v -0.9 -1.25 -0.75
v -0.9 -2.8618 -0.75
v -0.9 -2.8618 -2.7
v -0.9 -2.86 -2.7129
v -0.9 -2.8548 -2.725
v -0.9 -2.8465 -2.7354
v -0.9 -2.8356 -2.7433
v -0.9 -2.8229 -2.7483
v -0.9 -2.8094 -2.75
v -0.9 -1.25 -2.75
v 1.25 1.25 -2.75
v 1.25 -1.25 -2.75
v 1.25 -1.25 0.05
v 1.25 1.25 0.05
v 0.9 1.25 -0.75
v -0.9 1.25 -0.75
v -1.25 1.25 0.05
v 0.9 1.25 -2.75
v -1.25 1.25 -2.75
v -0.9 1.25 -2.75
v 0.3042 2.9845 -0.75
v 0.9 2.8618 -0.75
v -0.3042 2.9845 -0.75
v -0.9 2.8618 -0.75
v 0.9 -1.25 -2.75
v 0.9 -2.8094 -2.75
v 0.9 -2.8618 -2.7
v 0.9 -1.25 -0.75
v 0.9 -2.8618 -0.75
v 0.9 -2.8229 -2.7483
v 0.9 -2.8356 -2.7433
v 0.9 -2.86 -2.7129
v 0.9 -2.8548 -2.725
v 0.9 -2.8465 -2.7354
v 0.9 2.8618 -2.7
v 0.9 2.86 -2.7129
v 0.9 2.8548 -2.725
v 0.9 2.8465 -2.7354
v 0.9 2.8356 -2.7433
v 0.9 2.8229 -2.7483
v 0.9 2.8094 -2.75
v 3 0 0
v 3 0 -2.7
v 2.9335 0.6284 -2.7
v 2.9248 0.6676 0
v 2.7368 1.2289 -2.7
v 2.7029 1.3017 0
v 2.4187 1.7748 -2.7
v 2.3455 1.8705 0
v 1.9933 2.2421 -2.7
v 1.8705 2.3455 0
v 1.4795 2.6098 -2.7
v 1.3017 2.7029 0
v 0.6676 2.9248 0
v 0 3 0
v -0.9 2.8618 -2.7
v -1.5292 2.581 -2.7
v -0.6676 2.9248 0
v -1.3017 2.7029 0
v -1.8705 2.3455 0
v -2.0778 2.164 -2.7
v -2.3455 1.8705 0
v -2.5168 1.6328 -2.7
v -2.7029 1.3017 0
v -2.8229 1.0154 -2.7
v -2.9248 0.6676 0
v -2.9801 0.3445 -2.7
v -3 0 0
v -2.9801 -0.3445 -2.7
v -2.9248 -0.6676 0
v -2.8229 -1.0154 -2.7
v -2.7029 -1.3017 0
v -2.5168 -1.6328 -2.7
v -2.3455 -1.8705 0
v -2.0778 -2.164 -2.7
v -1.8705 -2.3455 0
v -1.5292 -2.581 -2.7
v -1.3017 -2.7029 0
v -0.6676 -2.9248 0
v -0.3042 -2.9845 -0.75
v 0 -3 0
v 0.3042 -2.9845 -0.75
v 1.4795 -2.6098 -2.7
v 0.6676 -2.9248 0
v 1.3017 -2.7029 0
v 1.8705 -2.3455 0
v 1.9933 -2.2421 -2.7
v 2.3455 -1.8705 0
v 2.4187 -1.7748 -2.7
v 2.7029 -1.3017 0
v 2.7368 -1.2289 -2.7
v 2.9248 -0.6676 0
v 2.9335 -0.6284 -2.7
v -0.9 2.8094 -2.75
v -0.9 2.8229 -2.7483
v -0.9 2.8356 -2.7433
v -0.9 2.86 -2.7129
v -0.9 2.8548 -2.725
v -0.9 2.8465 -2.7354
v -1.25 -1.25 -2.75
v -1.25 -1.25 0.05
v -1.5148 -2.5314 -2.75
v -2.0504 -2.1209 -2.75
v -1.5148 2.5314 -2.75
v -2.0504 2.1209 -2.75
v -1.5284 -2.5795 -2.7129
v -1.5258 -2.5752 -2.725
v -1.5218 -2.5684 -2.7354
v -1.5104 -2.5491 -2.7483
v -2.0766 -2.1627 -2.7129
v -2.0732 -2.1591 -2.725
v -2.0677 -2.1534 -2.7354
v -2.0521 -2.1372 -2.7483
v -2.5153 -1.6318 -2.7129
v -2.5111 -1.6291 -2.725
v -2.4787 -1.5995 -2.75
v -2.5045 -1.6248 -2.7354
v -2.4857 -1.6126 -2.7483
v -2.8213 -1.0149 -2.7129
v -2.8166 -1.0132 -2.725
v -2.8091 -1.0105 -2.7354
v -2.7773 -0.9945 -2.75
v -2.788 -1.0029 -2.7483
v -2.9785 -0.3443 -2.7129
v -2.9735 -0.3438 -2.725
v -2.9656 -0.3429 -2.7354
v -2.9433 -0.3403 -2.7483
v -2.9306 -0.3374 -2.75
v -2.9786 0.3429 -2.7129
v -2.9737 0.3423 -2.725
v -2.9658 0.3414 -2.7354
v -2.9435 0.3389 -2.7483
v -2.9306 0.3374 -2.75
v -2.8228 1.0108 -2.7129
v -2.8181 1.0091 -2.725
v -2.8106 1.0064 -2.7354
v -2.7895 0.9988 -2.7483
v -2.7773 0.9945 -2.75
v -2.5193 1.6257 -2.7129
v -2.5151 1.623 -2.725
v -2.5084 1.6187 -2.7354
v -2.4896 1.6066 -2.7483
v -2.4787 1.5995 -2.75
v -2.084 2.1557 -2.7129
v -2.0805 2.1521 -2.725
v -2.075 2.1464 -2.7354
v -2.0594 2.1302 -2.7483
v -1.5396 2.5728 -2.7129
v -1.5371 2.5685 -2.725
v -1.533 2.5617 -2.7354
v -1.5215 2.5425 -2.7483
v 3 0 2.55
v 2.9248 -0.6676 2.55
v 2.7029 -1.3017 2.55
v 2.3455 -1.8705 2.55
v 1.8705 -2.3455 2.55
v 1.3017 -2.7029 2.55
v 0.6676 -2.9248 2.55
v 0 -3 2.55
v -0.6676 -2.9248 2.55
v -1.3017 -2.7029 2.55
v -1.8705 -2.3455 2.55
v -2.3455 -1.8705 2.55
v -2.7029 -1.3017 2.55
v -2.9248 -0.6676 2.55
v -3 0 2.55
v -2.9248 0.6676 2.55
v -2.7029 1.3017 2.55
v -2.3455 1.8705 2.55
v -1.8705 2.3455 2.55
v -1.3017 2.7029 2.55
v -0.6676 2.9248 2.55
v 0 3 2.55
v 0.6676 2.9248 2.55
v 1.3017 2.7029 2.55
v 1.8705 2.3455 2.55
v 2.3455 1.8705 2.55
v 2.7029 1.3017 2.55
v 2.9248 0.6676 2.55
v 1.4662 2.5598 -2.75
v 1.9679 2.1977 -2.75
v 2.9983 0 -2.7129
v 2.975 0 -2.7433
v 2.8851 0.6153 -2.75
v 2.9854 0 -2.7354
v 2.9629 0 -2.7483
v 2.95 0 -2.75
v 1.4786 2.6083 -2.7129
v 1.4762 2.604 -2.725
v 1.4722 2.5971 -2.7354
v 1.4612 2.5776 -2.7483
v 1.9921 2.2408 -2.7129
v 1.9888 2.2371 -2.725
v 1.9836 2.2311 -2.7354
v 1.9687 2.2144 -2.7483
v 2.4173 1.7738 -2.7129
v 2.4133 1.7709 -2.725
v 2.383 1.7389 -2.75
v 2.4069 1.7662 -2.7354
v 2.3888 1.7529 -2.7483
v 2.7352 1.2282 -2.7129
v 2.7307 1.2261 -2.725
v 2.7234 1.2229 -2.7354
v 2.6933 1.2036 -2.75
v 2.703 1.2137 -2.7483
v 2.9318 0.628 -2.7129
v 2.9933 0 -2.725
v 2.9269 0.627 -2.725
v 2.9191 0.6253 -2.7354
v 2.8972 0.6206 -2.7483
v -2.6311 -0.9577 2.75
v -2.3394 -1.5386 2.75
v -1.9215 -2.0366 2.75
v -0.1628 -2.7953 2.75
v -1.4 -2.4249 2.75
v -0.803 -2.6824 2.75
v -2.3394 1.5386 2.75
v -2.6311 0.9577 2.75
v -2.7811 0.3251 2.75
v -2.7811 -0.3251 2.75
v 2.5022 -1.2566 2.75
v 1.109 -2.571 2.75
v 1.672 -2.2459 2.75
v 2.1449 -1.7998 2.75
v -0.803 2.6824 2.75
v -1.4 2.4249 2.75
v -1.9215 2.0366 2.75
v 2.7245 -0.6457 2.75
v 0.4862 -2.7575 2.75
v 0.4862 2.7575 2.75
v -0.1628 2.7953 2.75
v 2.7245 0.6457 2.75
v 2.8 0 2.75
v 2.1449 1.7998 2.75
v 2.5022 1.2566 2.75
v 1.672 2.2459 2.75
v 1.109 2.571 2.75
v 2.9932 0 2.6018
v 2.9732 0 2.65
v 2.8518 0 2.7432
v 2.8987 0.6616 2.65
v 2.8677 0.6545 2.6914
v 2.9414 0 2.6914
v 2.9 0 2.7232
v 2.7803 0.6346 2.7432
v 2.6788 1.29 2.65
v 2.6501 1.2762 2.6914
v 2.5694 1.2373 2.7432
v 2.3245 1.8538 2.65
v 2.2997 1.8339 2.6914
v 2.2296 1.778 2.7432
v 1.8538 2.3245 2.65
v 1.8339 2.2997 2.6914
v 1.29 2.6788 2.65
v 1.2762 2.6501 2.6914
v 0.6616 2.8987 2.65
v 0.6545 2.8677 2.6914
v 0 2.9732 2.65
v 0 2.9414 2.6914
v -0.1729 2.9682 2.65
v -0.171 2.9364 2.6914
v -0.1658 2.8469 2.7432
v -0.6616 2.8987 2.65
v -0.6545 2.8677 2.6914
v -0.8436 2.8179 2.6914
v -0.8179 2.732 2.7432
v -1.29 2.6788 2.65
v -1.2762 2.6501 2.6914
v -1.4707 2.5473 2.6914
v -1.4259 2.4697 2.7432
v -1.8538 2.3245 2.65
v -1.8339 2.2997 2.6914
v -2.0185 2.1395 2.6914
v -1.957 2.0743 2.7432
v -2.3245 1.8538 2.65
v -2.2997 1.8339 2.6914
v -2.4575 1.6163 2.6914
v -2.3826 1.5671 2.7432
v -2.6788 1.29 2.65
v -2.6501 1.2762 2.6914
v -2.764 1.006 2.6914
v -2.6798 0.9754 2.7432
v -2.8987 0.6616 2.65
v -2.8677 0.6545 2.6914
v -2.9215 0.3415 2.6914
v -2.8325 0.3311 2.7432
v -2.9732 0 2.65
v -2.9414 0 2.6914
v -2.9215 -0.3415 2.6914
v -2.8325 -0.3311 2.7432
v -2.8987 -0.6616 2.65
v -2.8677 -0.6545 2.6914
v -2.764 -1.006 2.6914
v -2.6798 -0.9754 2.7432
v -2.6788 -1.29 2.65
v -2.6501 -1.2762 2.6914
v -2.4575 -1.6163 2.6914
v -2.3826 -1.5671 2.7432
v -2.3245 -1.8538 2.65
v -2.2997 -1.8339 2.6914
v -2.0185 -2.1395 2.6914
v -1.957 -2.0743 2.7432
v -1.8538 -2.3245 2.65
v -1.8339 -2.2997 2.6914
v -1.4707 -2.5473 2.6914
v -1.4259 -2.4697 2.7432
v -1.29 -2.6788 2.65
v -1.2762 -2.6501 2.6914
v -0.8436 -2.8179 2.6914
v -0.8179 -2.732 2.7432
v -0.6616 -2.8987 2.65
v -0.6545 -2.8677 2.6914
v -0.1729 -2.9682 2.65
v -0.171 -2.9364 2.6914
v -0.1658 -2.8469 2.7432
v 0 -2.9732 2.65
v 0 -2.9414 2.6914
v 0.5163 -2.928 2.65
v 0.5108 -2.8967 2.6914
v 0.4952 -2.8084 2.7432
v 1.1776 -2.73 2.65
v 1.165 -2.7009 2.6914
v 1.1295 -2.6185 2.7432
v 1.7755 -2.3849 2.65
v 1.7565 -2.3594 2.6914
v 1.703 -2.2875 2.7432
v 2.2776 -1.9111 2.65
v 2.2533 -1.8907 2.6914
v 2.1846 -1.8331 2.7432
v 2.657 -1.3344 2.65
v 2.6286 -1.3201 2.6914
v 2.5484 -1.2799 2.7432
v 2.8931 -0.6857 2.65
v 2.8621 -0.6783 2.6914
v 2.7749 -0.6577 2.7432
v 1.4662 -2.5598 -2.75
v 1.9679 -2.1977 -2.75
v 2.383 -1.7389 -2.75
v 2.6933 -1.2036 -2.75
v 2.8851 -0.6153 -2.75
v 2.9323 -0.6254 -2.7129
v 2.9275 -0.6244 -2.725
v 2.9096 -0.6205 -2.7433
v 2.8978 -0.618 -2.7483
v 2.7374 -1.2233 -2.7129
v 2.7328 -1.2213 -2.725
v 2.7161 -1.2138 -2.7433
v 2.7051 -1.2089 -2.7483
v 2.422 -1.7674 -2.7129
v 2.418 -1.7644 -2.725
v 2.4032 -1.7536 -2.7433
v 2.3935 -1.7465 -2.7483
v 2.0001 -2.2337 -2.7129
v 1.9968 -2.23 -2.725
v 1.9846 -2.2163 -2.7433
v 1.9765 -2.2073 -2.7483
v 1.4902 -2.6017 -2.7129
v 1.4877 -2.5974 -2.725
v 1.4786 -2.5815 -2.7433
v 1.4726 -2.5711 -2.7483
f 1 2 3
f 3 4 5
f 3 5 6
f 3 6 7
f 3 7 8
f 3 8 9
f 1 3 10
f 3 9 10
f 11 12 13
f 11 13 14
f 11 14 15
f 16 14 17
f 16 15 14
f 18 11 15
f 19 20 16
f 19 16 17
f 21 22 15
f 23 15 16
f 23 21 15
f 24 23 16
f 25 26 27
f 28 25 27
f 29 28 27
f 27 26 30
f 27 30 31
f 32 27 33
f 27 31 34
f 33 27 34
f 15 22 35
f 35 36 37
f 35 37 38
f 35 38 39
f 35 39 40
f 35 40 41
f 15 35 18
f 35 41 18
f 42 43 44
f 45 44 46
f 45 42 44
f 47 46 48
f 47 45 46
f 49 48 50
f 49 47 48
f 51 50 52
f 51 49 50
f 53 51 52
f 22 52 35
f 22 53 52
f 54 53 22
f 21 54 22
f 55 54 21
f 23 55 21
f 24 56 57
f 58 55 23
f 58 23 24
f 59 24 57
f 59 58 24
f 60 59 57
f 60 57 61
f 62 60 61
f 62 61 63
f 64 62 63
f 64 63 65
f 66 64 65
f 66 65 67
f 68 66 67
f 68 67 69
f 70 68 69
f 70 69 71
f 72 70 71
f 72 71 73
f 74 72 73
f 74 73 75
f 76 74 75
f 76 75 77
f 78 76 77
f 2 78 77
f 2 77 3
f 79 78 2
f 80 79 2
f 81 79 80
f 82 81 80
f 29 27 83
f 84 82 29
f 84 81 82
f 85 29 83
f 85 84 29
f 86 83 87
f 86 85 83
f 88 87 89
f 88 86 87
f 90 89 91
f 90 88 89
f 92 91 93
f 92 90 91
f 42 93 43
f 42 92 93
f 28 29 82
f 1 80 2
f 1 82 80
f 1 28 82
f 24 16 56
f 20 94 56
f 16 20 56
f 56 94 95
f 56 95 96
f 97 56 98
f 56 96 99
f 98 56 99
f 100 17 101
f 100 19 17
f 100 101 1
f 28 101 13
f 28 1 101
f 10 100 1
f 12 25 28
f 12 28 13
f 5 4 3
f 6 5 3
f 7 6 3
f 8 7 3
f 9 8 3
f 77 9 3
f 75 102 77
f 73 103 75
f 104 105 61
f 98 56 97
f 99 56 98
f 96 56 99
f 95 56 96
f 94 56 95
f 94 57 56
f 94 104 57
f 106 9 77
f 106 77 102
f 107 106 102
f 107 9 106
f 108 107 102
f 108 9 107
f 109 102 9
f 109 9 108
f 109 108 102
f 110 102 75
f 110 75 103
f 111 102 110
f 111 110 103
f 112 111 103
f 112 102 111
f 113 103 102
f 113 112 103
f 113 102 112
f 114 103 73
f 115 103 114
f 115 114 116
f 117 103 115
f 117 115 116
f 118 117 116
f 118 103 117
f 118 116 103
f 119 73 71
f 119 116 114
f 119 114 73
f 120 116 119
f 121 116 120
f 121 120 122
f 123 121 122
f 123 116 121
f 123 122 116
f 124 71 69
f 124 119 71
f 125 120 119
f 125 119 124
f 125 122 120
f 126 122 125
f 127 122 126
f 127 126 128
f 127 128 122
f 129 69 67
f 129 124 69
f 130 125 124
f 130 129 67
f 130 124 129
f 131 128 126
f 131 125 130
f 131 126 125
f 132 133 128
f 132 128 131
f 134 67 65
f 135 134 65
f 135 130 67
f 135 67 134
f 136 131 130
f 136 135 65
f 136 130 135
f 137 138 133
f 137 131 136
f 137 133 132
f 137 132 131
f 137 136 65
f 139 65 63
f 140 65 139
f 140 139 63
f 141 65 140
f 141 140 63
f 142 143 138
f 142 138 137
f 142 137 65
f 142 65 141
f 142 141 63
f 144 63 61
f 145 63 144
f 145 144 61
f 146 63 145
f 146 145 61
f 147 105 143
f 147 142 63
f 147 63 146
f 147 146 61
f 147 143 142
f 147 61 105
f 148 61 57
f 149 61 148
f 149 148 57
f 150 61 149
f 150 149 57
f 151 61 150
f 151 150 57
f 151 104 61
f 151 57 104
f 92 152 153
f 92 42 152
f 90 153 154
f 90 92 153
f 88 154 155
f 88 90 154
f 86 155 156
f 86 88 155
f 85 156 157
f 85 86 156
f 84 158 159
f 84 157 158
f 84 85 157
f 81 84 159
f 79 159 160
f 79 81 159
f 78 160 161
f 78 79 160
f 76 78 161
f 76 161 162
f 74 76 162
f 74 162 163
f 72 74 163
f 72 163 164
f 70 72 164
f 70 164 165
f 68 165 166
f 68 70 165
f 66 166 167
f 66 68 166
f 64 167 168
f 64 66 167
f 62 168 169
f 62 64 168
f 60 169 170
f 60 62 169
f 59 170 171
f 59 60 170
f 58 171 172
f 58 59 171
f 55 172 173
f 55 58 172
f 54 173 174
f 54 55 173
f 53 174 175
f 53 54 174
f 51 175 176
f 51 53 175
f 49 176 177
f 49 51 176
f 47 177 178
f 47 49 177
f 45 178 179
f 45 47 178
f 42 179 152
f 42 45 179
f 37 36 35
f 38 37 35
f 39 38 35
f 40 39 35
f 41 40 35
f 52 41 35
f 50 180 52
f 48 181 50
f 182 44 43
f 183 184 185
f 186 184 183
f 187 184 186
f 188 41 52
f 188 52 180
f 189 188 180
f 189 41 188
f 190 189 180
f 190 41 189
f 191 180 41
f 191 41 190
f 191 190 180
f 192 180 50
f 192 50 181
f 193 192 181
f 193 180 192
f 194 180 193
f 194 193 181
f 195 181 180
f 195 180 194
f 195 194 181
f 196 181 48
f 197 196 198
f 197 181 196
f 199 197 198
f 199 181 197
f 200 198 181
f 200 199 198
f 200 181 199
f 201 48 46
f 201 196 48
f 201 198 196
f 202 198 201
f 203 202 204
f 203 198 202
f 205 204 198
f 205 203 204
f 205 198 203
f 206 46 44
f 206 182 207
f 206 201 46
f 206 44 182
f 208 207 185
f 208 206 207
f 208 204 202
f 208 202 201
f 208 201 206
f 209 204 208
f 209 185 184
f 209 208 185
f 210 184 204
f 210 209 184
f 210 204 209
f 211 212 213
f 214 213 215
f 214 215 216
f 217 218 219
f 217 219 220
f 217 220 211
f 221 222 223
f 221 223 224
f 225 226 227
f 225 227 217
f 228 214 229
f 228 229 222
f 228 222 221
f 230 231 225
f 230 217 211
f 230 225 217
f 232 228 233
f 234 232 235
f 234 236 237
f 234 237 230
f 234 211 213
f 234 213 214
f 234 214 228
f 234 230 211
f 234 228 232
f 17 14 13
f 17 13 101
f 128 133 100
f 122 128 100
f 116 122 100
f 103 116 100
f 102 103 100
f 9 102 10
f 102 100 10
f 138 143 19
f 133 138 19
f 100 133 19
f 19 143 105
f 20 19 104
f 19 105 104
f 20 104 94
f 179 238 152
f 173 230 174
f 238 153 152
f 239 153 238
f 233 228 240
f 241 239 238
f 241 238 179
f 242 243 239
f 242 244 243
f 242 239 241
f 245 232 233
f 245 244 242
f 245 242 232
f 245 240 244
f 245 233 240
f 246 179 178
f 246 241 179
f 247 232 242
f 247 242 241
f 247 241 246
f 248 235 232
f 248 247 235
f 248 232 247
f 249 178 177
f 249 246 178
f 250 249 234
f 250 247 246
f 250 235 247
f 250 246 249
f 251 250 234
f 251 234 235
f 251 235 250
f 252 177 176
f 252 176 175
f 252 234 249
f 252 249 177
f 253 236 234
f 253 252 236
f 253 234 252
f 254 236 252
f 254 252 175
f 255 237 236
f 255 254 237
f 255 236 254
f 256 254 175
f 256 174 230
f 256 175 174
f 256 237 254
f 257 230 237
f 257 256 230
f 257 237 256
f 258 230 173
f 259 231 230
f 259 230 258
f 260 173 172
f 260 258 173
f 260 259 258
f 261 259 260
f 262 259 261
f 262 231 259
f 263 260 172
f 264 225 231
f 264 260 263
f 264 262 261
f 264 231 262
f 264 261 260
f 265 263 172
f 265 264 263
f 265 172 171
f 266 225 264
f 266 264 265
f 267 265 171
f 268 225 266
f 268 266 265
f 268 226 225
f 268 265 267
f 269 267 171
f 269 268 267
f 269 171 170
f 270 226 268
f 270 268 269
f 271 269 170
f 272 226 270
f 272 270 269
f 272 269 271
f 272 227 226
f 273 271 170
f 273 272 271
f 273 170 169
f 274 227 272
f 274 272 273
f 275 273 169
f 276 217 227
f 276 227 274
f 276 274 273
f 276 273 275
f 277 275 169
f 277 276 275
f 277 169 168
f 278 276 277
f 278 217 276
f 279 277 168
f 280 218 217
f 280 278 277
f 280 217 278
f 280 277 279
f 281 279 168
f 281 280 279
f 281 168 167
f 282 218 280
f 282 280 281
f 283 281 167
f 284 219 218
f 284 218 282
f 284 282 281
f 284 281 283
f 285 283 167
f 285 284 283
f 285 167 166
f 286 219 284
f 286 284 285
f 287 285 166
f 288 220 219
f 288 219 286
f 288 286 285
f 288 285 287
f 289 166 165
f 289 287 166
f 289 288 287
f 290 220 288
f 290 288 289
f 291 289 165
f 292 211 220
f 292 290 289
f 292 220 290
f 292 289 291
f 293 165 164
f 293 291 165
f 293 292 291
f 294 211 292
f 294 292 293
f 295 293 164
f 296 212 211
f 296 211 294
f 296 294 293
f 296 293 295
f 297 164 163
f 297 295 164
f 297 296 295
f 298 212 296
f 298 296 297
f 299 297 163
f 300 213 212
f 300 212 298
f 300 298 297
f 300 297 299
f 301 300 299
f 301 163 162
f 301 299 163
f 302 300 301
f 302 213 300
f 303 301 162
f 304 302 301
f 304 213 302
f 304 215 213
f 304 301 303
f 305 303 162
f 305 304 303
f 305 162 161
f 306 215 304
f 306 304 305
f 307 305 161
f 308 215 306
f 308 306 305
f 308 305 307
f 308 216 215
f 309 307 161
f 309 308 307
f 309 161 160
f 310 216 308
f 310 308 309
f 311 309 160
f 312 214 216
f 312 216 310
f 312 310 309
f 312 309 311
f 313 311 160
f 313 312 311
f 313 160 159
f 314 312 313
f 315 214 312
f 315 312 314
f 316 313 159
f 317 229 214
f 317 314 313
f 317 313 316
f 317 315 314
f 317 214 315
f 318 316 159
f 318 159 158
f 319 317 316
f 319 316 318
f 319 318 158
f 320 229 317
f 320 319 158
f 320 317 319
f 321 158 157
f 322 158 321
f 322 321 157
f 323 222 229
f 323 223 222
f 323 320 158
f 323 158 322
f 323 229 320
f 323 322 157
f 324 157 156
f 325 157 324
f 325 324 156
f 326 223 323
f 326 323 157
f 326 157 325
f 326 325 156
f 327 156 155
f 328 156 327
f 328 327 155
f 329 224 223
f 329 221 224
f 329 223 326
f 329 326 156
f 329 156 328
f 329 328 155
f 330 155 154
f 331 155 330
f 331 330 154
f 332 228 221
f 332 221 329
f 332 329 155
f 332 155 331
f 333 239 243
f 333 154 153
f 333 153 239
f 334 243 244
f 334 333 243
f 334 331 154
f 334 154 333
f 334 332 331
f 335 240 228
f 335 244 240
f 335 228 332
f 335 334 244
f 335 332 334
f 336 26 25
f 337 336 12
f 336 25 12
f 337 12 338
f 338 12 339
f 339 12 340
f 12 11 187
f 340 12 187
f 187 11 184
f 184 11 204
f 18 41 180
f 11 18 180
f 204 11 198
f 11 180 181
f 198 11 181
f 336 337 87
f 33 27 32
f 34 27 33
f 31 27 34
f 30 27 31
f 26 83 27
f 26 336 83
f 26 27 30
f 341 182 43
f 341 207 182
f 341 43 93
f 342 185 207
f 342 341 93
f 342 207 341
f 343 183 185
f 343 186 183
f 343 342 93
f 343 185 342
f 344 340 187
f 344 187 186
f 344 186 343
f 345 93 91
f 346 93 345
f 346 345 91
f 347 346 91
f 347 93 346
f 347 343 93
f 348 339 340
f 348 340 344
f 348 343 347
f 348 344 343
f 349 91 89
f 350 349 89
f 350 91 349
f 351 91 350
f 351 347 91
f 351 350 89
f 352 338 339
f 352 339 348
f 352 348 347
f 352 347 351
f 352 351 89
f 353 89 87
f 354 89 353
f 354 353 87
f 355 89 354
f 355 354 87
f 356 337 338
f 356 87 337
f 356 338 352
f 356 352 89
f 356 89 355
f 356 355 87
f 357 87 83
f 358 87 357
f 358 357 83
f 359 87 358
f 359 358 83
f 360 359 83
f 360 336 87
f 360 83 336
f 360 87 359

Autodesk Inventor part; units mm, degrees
ref_plane "YZ Plane" through (0, 0, 0) normal (1, 0, 0) x (0, 1, 0)
ref_plane "XZ Plane" through (0, 0, 0) normal (0, 1, 0) x (-1, 0, 0)
ref_plane "XY Plane" through (0, 0, 0) normal (0, 0, 1) x (1, 0, 0)
sketch "Sketch1" plane through (0, 0, 0) normal (0, 0, 1) x (1, 0, 0)
  circle A0 centre (0, 0) radius 3
  dimension "d0" = 6
extrude "Extrusion1" add sketch "Sketch1" along normal mid plane 5.5
fillet "Fillet1" radius 0.2 1 edges at (-3, 0, 2.75)
fillet "Fillet1" radius 0.05 1 edges at (-3, 0, -2.75)
sketch "Sketch2" plane through (0, 0, -2.75) normal (0, 0, -1) x (-1, 0, 0)
  line L0 (1.25, -1.25) -> (-1.25, -1.25)
  line L1 (-1.25, -1.25) -> (-1.25, 1.25)
  line L2 (-1.25, 1.25) -> (1.25, 1.25)
  line L3 (1.25, 1.25) -> (1.25, -1.25)
  line L4 (1.25, -1.25) -> (-1.25, 1.25) construction
  line L5 (-1.25, -1.25) -> (1.25, 1.25) construction
  point P0 (0, 0)
  dimension "d5" = 2.5
extrude "Extrusion2" cut sketch "Sketch2" against normal blind 2.8
sketch "Sketch3" plane through (0, 0, -2.75) normal (0, 0, -1) x (-1, 0, 0)
  circle A0 centre (0, 0) radius 3 projected
  line L0 (-0.9, -3) -> (0.9, -3)
  line L1 (0.9, -3) -> (0.9, 3)
  line L2 (0.9, 3) -> (-0.9, 3)
  line L3 (-0.9, 3) -> (-0.9, -3)
  point P0 (0, 3)
  dimension "d8" = 1.8
extrude "Extrusion3" cut sketch "Sketch3" against normal blind 2 contours L1 A0 L3 | A0 L2 L1 | L1 L0 A0 | A0 L3 L2 | L0 L3 A0
properties part number "48-0077" material "ABS Plastic"
